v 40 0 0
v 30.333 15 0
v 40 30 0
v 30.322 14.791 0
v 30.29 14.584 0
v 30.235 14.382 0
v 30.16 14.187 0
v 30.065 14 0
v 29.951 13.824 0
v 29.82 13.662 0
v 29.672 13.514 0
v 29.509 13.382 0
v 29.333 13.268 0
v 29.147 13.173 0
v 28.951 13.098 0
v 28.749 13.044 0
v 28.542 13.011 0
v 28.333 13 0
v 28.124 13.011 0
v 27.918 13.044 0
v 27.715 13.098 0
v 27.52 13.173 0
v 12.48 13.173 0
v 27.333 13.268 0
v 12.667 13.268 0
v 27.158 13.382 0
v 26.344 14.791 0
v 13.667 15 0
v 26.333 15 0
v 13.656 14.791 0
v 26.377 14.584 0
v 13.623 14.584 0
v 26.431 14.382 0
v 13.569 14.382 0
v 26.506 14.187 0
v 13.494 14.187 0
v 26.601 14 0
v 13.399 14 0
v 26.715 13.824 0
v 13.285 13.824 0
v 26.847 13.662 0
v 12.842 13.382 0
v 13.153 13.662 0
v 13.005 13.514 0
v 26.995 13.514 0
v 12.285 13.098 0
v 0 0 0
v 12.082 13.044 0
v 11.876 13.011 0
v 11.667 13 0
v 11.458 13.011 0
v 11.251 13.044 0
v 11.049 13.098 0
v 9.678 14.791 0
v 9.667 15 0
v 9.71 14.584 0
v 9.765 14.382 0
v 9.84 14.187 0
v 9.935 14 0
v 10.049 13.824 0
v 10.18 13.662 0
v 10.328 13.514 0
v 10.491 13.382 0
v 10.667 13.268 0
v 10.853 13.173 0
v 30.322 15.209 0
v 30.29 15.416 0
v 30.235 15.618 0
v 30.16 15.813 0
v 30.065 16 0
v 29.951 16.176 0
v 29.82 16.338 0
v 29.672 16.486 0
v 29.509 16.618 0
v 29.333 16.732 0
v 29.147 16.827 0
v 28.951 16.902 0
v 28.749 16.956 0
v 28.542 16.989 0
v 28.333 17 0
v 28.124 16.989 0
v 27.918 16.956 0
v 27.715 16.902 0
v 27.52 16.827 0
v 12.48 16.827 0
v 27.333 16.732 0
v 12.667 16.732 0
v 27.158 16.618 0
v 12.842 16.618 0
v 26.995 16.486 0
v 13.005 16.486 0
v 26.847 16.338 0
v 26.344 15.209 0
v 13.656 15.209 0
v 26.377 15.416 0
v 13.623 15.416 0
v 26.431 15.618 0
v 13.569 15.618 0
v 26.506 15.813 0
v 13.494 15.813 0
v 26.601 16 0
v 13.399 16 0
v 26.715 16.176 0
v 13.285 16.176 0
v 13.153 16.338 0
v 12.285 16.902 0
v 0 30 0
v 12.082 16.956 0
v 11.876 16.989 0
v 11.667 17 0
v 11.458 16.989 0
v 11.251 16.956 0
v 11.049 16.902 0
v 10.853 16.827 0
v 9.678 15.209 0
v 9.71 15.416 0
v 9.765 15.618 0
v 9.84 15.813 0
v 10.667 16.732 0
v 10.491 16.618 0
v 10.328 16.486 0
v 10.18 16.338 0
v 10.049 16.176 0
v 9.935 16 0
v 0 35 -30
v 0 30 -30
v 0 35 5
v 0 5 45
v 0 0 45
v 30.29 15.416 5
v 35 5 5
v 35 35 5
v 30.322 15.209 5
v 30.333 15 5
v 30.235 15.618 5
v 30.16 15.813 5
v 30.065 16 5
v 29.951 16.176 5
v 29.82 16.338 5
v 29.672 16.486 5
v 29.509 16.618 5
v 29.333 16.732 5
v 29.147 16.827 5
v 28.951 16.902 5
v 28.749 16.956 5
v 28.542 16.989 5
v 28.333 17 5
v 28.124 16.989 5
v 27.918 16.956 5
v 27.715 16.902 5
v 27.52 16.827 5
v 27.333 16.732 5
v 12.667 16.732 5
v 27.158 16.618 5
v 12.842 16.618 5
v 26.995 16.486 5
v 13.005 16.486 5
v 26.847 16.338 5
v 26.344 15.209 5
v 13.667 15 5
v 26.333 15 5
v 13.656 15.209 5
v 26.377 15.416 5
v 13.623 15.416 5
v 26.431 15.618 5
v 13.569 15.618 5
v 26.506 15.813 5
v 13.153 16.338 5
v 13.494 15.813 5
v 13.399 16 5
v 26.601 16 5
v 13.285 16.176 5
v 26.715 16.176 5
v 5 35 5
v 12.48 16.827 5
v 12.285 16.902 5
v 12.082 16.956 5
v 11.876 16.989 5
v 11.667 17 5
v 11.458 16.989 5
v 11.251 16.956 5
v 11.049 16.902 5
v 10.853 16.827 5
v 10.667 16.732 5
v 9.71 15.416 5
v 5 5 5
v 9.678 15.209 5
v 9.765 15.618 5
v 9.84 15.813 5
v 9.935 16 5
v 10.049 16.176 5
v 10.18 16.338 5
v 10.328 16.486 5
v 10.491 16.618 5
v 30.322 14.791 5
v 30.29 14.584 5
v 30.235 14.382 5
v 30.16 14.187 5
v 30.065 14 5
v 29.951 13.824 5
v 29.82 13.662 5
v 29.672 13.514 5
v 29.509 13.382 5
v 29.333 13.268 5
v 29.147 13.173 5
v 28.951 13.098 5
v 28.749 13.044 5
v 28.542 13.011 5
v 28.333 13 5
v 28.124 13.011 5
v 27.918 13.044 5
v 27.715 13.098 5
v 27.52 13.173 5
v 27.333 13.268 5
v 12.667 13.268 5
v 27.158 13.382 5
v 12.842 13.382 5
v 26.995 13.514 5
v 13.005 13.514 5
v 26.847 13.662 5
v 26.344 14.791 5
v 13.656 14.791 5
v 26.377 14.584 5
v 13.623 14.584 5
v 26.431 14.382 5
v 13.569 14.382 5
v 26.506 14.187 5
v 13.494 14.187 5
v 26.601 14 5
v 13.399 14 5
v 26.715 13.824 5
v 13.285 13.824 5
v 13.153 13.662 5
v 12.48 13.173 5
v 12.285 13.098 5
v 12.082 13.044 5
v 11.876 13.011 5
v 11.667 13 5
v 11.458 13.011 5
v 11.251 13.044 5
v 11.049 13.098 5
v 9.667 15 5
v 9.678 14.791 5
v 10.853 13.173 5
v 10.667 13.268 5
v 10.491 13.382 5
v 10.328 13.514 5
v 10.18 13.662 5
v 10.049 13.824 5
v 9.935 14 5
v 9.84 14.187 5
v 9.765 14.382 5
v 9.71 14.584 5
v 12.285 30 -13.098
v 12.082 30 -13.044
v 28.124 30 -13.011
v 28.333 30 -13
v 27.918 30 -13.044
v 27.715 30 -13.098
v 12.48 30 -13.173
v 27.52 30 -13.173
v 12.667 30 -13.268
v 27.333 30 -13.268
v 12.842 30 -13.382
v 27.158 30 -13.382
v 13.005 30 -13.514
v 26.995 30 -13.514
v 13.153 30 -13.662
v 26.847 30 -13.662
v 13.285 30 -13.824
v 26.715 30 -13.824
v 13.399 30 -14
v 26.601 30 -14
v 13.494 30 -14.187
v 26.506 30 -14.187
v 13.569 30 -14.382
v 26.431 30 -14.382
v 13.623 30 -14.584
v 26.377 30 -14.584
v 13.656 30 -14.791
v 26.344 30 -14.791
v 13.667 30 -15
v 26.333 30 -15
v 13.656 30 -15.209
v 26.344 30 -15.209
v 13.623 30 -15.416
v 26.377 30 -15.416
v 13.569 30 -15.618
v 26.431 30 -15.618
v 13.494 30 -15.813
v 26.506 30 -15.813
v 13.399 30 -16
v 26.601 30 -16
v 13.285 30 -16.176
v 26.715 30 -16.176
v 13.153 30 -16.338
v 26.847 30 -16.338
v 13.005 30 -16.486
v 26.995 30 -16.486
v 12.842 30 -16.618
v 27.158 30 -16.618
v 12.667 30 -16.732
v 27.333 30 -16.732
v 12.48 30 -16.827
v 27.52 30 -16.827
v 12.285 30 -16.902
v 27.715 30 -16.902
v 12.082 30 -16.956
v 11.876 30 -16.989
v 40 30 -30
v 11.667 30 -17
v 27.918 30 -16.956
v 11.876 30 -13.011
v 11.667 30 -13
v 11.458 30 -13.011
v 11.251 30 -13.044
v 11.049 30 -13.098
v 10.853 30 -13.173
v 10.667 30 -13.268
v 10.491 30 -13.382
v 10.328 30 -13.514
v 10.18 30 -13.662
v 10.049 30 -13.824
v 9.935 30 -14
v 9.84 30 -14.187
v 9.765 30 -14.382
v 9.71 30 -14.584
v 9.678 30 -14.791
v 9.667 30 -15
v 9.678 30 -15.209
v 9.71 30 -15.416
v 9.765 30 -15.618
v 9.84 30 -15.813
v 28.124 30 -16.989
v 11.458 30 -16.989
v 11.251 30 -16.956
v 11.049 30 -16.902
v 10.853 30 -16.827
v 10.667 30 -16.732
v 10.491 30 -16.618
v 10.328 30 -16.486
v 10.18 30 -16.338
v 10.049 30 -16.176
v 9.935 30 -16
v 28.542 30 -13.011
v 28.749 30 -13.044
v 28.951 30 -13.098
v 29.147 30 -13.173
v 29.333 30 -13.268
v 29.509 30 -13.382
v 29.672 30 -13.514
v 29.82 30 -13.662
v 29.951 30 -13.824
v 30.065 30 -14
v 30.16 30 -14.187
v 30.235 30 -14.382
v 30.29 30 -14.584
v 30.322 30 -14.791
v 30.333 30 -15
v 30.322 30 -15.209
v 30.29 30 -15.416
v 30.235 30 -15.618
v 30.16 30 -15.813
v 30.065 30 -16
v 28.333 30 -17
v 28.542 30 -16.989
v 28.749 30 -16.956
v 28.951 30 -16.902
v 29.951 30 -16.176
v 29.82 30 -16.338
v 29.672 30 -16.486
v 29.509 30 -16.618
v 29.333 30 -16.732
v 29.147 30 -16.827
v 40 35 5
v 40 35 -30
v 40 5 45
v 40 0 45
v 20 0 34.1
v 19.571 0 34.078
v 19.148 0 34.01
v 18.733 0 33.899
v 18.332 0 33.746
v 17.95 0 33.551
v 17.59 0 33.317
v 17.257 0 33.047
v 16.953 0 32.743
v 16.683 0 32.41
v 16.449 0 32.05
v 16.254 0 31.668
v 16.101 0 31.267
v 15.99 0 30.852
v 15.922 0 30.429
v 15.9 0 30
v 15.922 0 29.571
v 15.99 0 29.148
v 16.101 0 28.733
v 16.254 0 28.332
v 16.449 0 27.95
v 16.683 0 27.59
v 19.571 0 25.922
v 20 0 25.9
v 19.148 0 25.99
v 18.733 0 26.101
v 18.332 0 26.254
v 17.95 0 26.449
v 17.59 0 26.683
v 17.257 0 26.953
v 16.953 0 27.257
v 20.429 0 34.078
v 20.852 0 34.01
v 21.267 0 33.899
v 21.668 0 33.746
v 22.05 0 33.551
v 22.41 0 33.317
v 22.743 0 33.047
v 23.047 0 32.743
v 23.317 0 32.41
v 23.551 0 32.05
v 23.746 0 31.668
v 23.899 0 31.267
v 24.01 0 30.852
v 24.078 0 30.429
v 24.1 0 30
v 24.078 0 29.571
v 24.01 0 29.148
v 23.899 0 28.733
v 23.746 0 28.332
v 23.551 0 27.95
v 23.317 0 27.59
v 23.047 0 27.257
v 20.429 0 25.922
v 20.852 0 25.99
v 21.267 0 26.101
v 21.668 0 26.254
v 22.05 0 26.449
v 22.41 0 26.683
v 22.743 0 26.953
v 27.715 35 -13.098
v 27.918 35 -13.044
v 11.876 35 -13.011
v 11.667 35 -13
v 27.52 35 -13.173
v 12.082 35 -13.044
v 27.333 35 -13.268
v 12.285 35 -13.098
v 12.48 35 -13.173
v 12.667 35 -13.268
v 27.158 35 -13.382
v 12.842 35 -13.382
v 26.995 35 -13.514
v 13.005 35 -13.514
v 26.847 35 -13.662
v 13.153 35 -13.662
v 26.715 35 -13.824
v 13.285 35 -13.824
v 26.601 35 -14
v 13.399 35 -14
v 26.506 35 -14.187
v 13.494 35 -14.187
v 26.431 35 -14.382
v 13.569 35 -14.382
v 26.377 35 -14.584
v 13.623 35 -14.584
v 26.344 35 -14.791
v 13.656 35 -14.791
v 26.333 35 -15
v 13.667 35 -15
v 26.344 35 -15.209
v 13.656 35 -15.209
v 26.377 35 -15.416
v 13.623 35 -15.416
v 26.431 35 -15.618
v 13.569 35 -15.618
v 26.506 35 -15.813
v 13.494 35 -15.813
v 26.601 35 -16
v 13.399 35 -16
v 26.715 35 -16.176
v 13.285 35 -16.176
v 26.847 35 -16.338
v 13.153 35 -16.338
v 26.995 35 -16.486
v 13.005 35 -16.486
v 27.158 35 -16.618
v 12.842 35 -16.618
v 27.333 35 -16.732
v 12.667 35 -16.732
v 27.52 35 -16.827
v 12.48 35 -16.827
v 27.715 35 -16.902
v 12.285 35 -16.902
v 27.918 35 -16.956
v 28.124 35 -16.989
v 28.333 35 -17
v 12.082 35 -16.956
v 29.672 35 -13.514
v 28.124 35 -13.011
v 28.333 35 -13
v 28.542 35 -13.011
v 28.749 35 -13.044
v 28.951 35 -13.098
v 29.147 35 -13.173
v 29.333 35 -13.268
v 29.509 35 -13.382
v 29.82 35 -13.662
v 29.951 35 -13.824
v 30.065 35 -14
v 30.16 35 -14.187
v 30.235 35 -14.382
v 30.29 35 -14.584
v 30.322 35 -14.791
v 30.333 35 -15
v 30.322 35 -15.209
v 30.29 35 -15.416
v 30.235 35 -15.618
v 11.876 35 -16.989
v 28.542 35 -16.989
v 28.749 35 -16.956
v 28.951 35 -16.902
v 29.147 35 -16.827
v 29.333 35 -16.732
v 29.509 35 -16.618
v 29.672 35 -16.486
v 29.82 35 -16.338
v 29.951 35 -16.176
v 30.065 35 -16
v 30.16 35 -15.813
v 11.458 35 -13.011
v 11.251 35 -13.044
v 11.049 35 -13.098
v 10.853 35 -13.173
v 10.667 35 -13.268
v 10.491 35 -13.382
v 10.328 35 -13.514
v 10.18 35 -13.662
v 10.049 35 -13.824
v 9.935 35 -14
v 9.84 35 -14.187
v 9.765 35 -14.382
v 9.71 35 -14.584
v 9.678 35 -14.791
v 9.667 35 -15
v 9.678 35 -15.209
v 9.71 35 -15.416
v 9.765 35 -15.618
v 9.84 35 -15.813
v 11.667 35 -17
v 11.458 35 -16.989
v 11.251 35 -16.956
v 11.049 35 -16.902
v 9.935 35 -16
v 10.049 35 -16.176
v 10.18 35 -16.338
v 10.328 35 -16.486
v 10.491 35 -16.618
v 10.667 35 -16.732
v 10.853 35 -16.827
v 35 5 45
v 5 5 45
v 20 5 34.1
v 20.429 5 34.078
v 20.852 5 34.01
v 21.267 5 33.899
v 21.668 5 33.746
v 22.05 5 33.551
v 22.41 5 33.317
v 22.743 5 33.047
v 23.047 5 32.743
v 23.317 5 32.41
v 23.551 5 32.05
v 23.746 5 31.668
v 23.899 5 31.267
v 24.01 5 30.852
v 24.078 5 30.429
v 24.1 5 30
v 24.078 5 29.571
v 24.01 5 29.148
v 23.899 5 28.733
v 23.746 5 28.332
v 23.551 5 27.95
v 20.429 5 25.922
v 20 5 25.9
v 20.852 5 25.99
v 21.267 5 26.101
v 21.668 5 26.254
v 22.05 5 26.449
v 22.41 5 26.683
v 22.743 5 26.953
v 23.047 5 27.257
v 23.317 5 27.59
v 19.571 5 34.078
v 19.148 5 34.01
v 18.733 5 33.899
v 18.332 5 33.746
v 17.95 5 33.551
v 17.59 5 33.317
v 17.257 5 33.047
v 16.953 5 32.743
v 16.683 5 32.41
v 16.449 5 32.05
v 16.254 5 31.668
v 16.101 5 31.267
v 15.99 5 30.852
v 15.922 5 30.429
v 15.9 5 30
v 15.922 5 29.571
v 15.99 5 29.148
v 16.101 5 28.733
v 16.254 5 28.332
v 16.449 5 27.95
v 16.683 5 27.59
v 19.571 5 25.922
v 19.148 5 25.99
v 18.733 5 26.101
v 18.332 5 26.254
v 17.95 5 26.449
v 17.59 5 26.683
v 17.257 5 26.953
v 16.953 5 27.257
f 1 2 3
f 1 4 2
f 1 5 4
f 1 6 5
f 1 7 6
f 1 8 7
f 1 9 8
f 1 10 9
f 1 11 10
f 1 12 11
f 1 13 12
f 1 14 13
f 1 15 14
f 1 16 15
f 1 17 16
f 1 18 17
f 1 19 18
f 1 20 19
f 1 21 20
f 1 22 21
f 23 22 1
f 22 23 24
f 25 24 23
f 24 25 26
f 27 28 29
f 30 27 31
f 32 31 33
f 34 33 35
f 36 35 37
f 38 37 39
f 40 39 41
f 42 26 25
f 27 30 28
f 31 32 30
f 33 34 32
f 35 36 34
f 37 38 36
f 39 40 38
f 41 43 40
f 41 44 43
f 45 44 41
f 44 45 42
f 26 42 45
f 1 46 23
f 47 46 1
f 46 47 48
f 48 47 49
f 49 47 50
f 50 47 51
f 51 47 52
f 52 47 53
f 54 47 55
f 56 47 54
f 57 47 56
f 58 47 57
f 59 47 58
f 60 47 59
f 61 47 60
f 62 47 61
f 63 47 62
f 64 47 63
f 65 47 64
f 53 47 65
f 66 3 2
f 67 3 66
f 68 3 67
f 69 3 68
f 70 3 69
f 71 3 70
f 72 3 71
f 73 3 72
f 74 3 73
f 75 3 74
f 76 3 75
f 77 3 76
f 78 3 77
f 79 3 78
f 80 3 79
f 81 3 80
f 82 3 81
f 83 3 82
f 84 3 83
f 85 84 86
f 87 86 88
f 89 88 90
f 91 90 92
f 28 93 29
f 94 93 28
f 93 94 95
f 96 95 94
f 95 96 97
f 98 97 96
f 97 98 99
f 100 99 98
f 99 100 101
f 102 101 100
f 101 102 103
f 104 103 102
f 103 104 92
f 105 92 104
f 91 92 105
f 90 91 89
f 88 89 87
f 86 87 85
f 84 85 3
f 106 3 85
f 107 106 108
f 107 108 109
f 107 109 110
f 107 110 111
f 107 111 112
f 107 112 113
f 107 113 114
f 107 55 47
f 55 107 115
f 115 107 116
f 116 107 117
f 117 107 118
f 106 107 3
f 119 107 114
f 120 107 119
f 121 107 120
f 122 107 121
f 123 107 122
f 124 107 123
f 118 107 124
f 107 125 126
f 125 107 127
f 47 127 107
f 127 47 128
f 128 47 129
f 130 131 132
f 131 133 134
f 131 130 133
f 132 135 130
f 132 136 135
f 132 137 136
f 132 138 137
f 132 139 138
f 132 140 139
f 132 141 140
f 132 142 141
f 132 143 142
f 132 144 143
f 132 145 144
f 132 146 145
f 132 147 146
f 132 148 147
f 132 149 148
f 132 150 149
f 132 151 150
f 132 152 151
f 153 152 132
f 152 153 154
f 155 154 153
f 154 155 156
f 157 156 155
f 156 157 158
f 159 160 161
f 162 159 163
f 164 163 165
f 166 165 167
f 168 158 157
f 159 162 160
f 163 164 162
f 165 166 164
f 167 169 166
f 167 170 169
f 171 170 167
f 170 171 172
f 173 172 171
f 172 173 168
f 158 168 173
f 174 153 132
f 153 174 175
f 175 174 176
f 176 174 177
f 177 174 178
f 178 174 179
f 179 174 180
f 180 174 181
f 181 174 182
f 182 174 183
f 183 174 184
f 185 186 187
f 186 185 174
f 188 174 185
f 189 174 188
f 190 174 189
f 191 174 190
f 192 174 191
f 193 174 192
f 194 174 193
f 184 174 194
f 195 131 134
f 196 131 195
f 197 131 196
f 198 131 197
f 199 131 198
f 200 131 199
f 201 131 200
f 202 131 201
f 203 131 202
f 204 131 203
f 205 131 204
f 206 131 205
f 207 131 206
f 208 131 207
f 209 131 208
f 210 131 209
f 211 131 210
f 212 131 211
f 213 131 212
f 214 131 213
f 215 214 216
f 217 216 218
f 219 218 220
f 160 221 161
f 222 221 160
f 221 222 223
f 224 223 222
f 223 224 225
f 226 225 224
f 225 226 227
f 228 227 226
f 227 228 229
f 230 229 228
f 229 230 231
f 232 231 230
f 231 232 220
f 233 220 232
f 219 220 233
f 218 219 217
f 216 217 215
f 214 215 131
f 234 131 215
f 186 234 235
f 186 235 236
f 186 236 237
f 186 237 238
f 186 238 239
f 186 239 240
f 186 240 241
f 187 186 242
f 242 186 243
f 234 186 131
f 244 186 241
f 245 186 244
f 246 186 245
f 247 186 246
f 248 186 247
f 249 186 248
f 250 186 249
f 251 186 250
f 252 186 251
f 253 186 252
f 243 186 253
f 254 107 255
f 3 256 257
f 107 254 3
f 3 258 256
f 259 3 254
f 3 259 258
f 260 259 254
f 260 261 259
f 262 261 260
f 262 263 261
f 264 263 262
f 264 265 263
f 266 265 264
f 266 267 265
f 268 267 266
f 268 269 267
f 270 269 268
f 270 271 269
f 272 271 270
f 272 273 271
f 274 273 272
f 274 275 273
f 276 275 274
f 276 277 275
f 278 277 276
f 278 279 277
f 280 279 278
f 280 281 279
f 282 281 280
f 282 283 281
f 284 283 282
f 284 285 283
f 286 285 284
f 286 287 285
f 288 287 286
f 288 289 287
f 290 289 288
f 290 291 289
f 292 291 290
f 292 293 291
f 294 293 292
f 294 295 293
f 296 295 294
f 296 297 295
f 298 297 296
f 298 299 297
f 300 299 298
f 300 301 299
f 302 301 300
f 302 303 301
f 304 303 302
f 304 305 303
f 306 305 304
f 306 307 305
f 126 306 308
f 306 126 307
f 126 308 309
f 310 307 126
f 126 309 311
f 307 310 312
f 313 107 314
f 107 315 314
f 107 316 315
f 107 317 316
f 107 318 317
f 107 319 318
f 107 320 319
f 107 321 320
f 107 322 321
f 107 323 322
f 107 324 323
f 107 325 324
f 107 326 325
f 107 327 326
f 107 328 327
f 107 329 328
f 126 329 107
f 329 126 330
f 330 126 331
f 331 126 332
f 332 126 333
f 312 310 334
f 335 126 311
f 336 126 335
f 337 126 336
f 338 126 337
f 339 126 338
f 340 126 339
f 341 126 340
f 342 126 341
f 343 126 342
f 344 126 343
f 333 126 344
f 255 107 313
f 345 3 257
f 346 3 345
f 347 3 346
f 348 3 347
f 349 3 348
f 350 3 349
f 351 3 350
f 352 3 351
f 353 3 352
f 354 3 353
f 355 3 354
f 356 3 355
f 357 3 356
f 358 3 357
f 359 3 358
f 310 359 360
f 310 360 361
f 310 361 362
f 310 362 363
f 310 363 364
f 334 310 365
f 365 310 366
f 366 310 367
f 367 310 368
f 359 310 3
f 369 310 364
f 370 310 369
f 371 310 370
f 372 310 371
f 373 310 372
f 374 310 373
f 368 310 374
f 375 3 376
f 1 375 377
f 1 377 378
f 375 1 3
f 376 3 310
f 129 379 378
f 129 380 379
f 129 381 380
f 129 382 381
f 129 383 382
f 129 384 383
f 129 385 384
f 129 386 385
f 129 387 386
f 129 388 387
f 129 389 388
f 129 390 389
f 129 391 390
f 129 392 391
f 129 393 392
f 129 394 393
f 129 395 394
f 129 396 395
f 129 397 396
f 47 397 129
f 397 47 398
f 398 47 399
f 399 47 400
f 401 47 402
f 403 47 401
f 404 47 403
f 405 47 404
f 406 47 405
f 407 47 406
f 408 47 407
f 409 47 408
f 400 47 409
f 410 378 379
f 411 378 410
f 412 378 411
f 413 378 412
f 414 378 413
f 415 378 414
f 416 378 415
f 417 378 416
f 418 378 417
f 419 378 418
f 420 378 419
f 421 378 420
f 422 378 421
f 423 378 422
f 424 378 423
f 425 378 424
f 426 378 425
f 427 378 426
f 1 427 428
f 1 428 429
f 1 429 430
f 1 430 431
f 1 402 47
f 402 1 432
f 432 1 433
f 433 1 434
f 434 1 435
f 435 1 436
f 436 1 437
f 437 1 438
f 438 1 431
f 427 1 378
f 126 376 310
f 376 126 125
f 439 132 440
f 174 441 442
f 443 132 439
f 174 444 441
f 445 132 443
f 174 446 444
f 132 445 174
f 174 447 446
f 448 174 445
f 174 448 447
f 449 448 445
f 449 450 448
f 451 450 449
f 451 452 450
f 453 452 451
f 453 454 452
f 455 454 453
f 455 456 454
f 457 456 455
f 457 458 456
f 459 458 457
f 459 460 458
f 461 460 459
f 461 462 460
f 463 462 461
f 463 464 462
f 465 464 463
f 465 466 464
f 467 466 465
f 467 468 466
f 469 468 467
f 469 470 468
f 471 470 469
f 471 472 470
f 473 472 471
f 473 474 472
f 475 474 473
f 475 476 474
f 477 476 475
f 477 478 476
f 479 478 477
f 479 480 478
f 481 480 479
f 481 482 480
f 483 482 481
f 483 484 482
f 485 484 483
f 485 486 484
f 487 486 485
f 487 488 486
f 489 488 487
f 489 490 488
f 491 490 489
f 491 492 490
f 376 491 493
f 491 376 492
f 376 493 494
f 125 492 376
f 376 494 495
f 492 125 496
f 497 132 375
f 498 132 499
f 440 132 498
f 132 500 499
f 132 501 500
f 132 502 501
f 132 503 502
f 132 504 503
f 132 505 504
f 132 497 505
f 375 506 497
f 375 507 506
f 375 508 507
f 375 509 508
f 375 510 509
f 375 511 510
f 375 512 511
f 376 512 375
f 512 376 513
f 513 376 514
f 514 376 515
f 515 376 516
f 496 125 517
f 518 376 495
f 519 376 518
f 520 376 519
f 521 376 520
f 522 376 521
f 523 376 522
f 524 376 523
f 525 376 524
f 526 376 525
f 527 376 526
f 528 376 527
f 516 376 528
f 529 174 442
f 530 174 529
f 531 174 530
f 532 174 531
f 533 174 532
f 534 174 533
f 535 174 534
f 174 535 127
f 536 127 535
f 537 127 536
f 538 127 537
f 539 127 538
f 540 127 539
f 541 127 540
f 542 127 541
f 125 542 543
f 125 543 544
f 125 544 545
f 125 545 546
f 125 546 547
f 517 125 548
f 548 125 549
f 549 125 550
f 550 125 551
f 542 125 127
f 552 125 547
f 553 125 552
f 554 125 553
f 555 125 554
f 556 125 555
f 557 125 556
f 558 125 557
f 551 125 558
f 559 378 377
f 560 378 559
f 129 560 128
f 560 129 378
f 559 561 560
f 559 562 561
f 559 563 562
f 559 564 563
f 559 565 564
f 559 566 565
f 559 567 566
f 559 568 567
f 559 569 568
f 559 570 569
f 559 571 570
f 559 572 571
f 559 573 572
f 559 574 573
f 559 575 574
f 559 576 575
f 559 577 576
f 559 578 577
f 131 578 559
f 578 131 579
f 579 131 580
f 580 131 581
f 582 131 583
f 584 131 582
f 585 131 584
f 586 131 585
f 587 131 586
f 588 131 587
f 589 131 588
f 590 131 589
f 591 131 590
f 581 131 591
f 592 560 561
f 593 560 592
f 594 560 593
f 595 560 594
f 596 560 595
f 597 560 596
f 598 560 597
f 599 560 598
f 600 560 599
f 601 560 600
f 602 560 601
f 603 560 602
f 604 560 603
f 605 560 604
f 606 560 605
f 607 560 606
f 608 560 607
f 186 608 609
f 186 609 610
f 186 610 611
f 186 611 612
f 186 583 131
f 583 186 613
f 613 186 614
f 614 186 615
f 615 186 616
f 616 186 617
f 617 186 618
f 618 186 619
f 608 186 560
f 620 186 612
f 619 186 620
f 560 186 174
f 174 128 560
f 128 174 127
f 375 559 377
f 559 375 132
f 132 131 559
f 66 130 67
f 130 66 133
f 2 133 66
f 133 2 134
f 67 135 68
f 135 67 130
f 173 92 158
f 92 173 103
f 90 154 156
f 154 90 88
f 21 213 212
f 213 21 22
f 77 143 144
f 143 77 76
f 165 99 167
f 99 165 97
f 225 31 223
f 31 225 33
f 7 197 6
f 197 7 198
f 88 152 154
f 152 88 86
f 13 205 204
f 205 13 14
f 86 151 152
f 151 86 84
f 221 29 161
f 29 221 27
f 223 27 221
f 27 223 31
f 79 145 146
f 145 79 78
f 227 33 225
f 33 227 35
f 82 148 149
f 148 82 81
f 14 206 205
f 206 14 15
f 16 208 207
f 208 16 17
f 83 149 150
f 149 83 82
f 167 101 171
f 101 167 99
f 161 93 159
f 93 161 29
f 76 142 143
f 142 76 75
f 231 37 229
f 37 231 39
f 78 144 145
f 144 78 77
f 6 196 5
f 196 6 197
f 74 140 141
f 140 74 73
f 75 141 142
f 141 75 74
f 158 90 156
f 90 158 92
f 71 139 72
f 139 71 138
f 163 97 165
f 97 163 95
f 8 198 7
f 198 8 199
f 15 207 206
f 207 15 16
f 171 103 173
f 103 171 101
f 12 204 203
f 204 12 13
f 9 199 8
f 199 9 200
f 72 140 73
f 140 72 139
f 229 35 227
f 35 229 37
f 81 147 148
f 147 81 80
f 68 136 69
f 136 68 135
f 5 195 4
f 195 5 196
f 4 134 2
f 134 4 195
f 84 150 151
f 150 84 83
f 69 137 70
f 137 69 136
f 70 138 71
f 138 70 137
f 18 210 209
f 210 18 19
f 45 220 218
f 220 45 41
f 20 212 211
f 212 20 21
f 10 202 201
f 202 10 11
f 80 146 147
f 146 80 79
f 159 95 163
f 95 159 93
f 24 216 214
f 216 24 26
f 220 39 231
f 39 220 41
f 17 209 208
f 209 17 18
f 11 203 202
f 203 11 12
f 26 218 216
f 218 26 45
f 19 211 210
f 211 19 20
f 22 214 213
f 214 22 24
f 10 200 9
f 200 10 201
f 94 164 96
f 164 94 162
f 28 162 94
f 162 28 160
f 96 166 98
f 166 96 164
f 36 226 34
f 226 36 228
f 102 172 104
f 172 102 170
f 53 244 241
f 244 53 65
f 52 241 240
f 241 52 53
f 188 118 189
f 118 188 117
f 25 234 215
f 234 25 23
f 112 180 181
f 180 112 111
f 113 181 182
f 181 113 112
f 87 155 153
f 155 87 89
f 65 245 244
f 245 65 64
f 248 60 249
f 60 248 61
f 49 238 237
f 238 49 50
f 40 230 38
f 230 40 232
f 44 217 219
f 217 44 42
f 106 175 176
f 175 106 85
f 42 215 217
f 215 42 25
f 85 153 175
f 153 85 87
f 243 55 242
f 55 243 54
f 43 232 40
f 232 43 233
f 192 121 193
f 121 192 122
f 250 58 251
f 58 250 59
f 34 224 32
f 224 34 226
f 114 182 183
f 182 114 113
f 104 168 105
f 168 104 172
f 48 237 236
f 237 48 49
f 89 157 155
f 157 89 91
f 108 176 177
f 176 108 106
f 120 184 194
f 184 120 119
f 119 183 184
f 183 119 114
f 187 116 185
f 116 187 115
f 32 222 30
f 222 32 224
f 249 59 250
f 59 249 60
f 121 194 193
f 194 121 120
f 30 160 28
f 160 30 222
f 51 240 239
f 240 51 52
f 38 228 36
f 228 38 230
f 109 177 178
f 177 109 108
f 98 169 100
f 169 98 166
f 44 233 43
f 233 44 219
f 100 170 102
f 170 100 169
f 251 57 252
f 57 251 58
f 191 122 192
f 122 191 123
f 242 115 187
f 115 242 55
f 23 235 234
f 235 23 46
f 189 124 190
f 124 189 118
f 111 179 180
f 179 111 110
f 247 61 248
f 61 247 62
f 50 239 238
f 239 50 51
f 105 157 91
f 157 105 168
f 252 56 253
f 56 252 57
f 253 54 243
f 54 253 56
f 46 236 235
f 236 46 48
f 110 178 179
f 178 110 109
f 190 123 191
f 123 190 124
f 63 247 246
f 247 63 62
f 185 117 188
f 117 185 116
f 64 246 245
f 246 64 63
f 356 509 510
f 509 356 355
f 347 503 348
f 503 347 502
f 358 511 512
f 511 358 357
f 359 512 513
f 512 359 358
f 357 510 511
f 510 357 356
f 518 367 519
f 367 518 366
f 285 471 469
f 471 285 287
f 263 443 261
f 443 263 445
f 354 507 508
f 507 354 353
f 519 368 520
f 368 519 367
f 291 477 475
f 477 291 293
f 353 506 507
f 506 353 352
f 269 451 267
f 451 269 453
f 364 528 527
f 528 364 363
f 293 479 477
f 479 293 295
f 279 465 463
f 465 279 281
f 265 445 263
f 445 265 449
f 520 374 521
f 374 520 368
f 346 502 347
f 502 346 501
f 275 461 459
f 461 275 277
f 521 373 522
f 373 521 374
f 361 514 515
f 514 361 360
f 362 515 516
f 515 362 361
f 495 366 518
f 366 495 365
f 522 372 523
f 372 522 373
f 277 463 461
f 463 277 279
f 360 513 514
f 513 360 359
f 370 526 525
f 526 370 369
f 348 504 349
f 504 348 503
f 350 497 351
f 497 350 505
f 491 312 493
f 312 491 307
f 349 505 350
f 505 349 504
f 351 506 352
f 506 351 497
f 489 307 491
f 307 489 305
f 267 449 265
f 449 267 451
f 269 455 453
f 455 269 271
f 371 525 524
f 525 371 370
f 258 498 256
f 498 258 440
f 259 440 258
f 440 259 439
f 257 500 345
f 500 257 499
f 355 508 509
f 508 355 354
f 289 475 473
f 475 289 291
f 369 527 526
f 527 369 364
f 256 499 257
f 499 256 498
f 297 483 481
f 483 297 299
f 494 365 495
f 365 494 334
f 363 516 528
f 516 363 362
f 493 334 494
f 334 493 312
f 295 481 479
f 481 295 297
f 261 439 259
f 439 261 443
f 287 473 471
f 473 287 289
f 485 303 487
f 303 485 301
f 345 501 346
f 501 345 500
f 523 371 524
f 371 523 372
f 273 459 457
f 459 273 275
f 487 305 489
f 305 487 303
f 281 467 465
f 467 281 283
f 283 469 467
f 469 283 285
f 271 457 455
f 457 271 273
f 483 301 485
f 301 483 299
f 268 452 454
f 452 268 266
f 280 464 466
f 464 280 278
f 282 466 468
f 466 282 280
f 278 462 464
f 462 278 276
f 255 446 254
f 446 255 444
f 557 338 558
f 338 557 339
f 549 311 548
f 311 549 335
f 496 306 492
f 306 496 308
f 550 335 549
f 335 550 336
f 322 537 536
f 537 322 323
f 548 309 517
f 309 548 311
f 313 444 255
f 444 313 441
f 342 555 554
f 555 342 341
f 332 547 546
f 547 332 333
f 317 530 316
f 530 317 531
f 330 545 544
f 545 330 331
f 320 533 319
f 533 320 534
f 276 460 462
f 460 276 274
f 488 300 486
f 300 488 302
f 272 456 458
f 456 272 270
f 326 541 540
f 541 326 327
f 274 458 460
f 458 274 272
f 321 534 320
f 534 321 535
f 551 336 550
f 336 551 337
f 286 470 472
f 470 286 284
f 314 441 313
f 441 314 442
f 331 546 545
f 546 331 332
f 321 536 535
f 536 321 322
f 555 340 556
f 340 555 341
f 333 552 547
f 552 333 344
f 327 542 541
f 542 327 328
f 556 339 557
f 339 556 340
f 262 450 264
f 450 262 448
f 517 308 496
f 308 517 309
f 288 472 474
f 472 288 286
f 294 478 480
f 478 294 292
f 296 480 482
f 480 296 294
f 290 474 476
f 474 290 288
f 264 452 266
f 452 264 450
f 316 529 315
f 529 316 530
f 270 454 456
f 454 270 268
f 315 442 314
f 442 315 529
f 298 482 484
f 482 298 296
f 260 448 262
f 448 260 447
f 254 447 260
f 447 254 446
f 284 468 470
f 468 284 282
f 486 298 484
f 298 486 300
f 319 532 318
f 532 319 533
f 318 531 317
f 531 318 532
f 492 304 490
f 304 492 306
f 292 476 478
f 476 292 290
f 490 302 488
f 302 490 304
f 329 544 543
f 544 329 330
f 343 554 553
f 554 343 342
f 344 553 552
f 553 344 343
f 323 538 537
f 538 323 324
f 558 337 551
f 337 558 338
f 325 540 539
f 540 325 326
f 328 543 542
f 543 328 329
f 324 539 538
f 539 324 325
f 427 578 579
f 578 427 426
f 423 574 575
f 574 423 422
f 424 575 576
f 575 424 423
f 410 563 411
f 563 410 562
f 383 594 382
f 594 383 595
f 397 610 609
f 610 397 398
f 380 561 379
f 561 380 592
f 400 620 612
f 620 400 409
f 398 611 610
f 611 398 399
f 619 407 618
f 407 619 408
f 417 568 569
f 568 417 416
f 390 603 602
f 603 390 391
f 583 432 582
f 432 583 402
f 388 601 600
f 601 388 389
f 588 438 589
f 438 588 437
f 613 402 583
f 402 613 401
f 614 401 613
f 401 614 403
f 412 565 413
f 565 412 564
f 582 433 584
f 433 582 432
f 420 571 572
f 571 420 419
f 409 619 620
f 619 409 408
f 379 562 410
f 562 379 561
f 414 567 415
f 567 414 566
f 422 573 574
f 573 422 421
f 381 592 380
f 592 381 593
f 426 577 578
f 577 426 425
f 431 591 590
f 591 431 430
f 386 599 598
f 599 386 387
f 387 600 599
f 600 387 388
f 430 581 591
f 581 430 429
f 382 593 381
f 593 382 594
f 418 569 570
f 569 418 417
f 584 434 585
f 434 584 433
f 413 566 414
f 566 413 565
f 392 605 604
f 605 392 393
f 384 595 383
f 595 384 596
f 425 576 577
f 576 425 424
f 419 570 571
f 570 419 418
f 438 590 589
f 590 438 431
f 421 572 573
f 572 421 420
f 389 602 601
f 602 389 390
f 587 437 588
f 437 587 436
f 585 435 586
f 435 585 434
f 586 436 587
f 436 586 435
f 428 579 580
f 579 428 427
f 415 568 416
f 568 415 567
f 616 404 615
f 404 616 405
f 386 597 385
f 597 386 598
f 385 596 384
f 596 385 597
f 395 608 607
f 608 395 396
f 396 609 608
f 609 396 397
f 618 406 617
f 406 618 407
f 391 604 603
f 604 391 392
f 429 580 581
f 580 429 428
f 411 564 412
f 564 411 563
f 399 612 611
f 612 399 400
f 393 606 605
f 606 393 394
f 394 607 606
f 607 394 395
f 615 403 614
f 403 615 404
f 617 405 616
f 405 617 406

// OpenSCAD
y_shaft_mount();

thickness=5;
width=40;
size=30;
bar_height=40;
hole_spacing=50/3;

module y_shaft_mount() {
  difference() {
    union() {
      linear_extrude(thickness)
        square([width,size]);
      translate([0,size,-size])
        linear_extrude(size+thickness)    
          square([width,thickness]);
      translate([0,0,thickness])
        linear_extrude(bar_height)
          square([width,thickness]);
      translate([0,size-thickness,size-thickness*2])
        side_wall();
      translate([width-thickness,size-thickness,size-thickness*2])
        side_wall();
    }
    holes();
  }  
  
  module holes() {
    $fn=60;
    translate([width/2+hole_spacing/2,15,0])
      cylinder(d=4,h=15);
    translate([width/2-hole_spacing/2,15,0])
      cylinder(d=4,h=15);
    translate([width/2+hole_spacing/2,40,-15])
      rotate([90,0,0])
        cylinder(d=4,h=15);
    translate([width/2-hole_spacing/2,40,-15])
      rotate([90,0,0])
        cylinder(d=4,h=15);
    translate([width/2,15,30])
      rotate([90,0,0])
        cylinder(d=8.2,h=20);
  }
  
  module side_wall() {
    rotate([0,180,0])
      rotate([90,0,0])
        rotate([0,90,0])
          translate([-20,-25,-5])
            linear_extrude(5)
              polygon([[0,0],[0,40],[30,40]]);
  }
}
